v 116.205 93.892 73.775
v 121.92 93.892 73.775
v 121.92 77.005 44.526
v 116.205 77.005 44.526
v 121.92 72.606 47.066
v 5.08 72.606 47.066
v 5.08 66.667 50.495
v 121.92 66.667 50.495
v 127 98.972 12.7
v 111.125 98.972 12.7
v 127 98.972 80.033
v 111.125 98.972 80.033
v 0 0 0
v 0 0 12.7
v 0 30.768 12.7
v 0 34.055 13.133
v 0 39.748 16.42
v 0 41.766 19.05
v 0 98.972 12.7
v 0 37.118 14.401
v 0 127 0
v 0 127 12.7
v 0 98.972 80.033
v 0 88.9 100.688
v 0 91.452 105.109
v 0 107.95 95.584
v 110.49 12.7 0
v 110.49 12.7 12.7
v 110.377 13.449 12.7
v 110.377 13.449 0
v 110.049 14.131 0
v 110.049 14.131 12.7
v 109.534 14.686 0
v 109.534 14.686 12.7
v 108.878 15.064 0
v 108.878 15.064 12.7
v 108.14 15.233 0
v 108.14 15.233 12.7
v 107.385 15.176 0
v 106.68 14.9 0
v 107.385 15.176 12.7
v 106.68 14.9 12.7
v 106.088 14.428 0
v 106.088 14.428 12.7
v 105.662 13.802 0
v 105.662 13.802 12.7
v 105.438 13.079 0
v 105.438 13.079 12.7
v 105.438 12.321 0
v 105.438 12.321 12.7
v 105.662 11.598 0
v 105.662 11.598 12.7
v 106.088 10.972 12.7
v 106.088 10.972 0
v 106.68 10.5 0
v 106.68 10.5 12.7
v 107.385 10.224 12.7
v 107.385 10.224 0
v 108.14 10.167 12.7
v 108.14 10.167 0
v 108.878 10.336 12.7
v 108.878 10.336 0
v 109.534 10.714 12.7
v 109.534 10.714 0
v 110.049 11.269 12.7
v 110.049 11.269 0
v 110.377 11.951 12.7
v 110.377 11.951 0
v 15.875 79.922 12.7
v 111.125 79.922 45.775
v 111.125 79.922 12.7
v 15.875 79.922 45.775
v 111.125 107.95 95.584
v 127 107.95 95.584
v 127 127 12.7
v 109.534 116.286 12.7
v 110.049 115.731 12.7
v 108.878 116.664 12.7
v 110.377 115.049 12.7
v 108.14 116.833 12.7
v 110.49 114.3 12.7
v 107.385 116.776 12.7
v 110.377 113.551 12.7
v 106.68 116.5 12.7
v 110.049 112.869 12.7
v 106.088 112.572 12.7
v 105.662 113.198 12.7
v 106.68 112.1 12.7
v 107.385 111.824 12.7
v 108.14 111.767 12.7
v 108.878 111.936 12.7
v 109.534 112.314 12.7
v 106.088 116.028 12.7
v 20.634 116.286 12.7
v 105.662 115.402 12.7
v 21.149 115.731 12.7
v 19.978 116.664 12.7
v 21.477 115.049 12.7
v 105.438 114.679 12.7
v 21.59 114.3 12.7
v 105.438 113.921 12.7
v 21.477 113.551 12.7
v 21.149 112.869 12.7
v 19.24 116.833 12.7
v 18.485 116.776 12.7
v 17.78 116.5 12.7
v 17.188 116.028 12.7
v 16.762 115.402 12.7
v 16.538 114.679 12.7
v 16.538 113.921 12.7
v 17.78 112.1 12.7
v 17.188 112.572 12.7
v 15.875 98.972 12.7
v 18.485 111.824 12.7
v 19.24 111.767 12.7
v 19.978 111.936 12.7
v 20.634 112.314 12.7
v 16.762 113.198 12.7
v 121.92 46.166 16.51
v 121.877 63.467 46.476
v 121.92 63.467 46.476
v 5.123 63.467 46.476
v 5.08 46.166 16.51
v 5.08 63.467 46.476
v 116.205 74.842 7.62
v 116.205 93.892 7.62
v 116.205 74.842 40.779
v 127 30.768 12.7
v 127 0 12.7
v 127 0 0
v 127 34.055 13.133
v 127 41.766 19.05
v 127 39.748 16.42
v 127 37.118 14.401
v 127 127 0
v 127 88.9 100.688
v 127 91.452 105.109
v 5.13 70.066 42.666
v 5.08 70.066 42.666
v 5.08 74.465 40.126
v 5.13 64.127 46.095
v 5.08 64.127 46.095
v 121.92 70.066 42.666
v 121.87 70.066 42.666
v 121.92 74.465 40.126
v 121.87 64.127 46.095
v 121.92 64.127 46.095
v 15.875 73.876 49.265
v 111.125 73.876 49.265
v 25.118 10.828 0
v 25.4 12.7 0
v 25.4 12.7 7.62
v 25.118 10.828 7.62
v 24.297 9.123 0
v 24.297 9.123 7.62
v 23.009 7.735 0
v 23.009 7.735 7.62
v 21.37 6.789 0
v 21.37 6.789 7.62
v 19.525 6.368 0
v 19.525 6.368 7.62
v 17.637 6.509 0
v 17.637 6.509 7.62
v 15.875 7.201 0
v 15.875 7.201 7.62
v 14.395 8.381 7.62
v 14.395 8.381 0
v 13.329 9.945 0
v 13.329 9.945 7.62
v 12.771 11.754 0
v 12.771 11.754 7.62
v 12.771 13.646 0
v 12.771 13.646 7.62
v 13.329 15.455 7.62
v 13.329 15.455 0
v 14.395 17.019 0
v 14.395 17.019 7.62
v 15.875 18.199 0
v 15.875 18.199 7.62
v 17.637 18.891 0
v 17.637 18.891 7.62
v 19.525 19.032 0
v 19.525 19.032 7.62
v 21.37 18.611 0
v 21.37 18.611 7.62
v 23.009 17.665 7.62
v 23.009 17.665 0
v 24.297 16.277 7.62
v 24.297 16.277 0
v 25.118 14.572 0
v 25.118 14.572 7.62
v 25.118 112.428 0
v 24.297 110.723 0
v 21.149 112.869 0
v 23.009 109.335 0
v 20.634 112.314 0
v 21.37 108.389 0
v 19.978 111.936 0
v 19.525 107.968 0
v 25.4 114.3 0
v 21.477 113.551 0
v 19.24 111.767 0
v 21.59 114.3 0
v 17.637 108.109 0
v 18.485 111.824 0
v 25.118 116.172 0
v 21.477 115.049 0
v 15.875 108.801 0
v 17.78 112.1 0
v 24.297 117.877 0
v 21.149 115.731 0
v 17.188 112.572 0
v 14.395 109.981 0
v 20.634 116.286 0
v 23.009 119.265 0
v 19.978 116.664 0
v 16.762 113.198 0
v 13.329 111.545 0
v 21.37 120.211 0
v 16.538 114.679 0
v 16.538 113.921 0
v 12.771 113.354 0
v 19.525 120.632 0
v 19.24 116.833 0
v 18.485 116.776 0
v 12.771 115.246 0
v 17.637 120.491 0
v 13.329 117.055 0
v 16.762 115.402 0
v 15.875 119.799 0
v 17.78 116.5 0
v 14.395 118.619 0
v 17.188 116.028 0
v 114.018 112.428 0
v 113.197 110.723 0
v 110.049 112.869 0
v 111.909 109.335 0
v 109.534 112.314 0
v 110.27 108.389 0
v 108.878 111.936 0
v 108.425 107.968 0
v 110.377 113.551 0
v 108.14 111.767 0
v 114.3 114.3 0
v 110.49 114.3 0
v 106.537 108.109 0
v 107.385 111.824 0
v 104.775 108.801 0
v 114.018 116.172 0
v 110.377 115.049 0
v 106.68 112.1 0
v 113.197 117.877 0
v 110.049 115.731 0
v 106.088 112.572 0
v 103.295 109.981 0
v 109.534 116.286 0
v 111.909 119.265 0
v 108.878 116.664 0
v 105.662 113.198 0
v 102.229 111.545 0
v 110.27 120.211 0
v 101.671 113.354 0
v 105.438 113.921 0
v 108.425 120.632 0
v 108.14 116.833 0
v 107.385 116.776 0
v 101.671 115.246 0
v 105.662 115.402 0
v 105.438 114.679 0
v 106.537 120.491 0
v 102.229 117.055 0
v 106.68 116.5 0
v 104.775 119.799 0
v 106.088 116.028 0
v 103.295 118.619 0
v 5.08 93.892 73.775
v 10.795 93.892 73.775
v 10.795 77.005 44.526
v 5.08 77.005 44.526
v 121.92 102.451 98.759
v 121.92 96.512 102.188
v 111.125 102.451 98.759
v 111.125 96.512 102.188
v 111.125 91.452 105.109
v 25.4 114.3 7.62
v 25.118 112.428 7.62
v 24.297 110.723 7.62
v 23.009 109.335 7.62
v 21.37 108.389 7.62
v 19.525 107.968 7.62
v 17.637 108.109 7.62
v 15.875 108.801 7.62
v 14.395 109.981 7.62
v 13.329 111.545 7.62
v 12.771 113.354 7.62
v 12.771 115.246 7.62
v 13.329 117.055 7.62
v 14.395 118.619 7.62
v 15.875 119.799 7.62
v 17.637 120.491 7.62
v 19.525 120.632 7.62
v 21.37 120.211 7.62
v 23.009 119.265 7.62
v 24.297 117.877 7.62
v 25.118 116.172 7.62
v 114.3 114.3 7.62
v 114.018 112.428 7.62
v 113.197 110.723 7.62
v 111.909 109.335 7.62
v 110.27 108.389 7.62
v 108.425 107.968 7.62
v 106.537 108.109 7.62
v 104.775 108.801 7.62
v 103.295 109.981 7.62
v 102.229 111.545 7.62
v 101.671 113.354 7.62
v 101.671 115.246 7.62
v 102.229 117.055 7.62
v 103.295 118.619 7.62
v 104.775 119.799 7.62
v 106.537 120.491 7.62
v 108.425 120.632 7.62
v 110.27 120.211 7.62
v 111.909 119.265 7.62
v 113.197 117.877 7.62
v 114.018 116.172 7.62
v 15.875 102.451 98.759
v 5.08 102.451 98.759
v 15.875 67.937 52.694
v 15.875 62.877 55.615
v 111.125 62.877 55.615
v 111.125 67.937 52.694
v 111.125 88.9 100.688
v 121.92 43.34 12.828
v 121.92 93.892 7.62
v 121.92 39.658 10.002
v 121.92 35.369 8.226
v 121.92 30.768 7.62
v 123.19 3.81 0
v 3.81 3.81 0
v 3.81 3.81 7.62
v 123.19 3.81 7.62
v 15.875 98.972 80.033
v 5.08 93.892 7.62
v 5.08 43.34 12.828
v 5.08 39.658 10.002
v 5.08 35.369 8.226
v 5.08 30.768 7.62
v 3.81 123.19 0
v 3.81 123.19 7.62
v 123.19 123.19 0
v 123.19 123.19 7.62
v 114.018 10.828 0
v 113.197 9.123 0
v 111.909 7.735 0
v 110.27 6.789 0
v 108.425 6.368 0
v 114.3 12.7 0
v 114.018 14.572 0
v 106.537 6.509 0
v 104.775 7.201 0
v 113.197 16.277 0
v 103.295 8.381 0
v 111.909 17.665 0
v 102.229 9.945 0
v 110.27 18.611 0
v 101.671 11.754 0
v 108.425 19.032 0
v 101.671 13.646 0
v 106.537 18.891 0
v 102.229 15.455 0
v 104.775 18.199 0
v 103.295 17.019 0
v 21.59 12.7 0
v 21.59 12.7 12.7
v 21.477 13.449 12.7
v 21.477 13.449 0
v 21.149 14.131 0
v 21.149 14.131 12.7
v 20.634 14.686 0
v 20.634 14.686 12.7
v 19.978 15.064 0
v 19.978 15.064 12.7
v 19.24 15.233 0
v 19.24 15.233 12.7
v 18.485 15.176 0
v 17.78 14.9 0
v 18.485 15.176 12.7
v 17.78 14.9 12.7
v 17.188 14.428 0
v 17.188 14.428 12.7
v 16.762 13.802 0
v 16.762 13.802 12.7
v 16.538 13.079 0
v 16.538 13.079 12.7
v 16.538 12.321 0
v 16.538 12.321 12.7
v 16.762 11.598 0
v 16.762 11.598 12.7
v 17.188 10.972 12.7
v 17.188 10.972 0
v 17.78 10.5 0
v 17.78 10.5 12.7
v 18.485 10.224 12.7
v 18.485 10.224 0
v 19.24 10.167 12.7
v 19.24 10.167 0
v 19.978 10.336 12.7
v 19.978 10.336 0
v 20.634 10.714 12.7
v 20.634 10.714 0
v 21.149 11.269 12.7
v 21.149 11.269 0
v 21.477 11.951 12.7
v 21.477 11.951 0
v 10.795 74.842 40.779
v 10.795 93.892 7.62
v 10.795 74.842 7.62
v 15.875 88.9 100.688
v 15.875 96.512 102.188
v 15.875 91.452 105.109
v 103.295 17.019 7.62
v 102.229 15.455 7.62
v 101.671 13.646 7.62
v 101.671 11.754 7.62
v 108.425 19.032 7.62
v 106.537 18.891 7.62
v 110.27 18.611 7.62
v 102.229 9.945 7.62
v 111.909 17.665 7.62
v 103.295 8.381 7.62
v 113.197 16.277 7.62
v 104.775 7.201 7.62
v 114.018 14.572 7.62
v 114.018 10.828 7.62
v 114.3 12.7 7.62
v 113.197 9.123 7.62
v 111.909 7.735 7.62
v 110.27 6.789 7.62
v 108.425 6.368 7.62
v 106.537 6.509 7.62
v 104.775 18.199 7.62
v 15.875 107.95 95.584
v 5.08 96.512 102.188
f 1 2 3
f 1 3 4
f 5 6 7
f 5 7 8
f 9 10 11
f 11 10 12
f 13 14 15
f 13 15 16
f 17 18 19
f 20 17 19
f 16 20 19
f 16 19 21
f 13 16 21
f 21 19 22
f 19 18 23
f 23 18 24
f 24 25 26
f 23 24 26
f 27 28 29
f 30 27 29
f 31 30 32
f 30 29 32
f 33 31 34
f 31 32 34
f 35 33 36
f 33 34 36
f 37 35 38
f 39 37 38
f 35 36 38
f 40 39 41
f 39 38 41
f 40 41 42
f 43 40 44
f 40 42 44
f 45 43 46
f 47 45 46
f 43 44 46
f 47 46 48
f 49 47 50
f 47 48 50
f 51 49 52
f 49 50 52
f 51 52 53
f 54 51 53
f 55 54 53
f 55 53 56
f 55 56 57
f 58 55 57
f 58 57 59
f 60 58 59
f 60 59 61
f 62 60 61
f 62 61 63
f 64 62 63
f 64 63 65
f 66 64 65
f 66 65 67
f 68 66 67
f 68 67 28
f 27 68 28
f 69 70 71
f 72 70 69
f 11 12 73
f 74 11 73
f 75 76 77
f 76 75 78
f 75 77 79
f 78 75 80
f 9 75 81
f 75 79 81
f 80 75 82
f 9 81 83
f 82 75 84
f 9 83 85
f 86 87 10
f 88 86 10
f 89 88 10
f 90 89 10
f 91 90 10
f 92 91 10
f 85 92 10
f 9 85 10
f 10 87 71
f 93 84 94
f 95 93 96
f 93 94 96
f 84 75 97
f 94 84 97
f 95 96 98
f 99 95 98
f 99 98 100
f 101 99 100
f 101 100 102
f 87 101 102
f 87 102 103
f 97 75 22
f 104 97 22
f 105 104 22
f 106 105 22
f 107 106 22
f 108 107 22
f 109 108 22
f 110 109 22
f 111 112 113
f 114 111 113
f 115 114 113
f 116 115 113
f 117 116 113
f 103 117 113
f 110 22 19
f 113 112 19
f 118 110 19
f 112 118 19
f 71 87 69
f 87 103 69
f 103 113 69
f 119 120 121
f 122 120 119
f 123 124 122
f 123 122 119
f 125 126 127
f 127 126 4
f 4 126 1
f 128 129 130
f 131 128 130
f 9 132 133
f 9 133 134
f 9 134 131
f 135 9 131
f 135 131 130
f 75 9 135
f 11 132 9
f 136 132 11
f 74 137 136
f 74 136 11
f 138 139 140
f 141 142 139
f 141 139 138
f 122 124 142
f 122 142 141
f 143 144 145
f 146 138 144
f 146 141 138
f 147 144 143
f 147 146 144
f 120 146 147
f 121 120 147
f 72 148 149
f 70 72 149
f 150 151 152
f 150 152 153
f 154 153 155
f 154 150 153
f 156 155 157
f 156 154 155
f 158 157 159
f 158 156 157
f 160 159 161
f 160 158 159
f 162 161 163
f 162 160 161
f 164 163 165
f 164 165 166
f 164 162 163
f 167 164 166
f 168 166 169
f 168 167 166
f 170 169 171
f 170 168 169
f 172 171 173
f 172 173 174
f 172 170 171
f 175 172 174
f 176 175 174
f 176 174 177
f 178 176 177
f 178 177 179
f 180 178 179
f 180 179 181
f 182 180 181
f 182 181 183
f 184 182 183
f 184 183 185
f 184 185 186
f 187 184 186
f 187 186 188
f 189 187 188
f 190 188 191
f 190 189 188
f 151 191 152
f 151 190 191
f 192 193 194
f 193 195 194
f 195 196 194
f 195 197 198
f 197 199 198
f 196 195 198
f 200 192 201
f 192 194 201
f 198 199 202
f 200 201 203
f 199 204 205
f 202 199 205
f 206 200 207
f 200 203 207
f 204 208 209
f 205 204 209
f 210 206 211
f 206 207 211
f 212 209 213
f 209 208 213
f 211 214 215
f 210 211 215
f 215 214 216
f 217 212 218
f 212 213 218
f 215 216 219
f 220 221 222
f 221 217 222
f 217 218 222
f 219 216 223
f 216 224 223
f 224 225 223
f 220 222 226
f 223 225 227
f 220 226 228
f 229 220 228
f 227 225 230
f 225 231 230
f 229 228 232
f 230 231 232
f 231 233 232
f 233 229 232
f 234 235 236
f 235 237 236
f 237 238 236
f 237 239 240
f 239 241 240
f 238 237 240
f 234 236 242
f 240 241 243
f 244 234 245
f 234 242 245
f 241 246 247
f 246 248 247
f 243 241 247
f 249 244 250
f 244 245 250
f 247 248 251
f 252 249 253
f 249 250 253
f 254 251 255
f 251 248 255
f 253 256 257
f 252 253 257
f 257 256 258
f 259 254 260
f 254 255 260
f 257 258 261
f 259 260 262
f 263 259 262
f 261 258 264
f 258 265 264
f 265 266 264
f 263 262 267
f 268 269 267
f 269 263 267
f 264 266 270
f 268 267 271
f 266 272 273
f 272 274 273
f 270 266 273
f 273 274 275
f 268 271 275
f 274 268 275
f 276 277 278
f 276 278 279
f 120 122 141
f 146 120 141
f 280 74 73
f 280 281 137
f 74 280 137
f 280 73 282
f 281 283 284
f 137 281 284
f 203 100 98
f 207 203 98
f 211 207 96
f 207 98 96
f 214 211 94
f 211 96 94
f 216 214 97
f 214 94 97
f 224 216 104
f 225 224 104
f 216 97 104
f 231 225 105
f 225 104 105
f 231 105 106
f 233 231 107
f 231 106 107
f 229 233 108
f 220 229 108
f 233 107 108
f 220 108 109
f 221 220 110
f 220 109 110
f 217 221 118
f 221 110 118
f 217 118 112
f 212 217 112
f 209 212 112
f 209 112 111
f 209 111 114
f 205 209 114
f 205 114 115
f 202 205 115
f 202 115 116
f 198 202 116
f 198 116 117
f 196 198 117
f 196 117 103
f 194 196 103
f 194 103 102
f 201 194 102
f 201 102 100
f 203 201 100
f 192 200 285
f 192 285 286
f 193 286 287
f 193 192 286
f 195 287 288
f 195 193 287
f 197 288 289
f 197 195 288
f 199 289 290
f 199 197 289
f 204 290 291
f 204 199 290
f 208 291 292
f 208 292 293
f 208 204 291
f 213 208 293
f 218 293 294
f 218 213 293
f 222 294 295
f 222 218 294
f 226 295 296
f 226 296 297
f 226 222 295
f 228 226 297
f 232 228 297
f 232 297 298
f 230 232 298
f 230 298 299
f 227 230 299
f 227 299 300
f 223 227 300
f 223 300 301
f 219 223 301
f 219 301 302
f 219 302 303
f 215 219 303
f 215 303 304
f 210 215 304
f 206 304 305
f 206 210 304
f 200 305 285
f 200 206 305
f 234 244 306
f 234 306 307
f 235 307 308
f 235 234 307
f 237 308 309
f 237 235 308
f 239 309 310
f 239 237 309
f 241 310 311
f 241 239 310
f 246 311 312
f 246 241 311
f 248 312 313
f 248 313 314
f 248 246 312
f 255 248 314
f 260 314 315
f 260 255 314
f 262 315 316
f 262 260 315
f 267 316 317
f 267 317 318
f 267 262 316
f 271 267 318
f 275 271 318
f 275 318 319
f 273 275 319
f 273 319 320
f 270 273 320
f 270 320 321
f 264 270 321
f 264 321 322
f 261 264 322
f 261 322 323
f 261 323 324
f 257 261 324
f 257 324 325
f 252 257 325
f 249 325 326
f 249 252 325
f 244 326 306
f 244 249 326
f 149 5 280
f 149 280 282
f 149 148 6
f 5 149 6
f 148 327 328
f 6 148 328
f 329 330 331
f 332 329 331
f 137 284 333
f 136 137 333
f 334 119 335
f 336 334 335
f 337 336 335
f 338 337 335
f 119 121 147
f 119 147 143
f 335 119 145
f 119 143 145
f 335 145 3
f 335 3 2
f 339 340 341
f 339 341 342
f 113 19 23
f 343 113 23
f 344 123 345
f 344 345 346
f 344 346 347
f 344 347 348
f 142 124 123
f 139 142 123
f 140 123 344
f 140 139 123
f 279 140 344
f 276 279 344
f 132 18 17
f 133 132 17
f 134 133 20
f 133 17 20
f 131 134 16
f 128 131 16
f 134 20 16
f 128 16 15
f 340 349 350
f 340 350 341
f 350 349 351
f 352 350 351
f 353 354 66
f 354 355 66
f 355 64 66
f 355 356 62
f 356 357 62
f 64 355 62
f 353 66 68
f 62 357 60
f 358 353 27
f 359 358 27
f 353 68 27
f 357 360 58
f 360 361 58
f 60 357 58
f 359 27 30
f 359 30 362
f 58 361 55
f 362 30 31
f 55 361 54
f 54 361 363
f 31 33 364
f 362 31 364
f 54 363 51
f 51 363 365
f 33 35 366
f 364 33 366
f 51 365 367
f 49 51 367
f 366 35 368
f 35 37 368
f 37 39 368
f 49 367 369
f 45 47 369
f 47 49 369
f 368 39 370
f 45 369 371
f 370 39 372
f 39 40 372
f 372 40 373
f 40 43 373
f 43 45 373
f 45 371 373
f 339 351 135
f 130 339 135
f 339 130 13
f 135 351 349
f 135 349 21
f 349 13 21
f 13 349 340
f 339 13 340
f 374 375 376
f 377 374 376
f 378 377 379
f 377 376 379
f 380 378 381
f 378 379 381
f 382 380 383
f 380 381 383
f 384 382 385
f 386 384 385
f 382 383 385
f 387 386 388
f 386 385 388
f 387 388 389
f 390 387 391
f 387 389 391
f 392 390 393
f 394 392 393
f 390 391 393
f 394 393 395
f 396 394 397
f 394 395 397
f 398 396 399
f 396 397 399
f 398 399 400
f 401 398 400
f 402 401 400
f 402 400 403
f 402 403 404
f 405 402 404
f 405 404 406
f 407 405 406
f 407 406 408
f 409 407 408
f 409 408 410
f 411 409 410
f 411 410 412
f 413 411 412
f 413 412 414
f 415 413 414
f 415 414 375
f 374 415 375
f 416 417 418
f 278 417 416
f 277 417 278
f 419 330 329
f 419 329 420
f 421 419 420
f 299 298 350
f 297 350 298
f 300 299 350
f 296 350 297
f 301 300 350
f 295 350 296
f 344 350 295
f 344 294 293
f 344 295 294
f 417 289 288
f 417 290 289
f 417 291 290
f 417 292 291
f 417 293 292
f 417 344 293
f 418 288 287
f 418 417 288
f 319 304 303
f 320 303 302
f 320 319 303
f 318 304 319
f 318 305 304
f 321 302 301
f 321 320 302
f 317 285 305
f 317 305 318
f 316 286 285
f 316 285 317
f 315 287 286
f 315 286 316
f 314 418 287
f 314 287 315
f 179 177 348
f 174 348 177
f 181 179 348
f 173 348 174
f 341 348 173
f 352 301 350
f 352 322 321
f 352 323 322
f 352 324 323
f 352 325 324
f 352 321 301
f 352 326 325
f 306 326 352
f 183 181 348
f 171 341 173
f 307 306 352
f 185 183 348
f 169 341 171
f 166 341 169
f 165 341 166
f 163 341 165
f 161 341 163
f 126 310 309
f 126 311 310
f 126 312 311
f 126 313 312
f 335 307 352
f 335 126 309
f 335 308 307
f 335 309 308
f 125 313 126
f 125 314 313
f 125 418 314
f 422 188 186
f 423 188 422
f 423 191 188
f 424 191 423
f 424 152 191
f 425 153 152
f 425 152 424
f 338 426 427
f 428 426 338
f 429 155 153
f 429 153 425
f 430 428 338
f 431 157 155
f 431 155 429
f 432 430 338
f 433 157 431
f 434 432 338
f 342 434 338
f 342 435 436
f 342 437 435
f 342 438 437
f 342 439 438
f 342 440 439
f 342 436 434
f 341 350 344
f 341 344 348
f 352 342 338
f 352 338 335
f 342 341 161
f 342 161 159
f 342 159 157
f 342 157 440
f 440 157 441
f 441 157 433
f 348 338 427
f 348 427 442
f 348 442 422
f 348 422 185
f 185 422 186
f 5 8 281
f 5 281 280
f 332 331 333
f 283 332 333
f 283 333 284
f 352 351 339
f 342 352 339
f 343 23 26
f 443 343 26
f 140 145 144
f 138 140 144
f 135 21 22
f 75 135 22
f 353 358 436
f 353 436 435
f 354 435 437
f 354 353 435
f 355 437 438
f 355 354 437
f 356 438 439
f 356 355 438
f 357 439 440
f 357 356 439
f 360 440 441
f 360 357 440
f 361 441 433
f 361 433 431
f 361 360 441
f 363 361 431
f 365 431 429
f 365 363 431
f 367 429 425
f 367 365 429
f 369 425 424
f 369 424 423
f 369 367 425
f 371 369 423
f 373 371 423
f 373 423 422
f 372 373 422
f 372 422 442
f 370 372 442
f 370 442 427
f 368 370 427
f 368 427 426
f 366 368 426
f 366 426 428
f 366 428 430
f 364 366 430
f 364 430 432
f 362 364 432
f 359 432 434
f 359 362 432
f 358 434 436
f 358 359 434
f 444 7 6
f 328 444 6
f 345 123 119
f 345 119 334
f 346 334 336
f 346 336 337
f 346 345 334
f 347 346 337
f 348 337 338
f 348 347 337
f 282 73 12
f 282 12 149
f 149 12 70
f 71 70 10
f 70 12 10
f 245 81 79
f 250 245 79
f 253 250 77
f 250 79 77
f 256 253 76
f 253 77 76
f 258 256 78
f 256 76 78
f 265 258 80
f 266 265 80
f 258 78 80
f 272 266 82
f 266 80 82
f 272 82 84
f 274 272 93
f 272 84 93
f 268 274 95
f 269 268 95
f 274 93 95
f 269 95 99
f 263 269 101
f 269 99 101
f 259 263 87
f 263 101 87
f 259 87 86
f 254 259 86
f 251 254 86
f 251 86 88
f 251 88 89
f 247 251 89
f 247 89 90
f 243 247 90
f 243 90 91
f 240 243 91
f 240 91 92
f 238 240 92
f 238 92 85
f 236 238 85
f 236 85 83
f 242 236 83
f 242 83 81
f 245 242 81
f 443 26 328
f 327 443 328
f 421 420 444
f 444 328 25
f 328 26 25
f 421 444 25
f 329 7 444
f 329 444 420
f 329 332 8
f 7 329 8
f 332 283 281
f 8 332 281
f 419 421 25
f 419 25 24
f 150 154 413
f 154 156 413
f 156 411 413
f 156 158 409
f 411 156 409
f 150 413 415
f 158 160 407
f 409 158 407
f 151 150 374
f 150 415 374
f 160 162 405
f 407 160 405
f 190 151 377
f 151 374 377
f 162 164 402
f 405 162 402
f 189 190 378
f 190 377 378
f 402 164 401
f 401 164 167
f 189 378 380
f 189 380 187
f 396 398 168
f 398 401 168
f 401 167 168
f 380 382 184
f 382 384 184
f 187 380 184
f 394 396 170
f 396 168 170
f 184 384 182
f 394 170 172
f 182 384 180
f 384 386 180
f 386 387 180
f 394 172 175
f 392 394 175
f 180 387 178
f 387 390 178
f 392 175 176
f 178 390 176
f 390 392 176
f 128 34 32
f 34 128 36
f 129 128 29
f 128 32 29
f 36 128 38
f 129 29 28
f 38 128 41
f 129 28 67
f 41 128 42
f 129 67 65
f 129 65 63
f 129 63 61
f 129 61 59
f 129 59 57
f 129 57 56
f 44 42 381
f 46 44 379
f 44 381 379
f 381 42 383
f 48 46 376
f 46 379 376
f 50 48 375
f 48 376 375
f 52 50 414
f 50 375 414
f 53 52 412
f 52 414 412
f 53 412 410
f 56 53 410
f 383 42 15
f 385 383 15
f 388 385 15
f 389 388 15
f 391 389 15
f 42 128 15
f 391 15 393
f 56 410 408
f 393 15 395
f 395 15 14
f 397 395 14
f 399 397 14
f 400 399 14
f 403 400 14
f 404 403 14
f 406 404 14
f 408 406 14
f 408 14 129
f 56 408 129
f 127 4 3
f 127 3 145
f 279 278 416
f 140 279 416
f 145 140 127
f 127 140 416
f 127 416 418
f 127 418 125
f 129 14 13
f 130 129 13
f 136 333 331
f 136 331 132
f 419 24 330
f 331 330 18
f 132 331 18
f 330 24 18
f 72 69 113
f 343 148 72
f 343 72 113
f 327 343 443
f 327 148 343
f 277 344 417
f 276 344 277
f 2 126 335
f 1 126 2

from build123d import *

# Parameters (mm, degrees)
F1_DEPTH      = 127
F2_W          = 95.25
F2_H          = 57.15
F3_DEPTH      = 83.3406583964
F4_R          = 2.54
F5_DEPTH      = 12.701
F6_R          = 2.54
F7_DEPTH      = 12.701
F8_W          = 106.045
F8_H          = 6.858
F8_W_2        = 10.795
F9_DEPTH      = 59.69
F10_W         = 95.25
F10_H         = 22.0760425496
F10_H_2       = 18.8356010627
F11_DEPTH     = 19.05
F12_W         = 119.38
F12_H         = 119.38
F12_R         = 6.35
F13_DEPTH     = 7.62
F14_T         = 5.08
F14_T3_DEPTH  = 17.78
F14_T5_DEPTH  = 26.035
F14_T7_DEPTH  = 29.21
F14_T9_DEPTH  = 105.41
F14_T11_DEPTH = 26.035
F14_T13_DEPTH = 17.1416638094
F14_T15_DEPTH = 43.2345651777
F14_T17_DEPTH = 16.002
F14_T19_DEPTH = 69.85
F14_T21_DEPTH = 127
F14_T23_DEPTH = 17.018
F14_T25_DEPTH = 17.018


# Not quite as in the source:
# - a shell that OpenCascade refuses in one call is made with other operations: the cavity is built on its own and cut out


with BuildPart() as f1:
    # F0 (on Right) → F1 (new body)
    with BuildSketch(Plane.YZ):
        with BuildLine():
            Line((0, 12.7), (0, 0))
            Line((0, 0), (127, 0))
            Line((127, 0), (127, 12.7))
            Line((127, 12.7), (98.9720369056, 12.7))
            Line((98.9720369056, 12.7), (98.9720369056, 80.0334606807))
            Line((98.9720369056, 80.0334606807), (107.95, 95.5837489087))
            Line((107.95, 95.5837489087), (91.4522160579, 105.1087489087))
            Line((91.4522160579, 105.1087489087), (88.9, 100.6881810245))
            Line((88.9, 100.6881810245), (41.7661742094, 19.05))
            ThreePointArc((41.7661742094, 19.05), (37.1176515813, 14.4014773719), (30.7676515813, 12.7))
            Line((30.7676515813, 12.7), (0, 12.7))
        make_face()
    extrude(amount=F1_DEPTH)

    # F2 (on face) → F3 (cut, through all)
    with BuildSketch(Plane(origin=(0, 23.075738686, -13.3227839421), x_dir=(1, 0, 0), z_dir=(0, -0.8660254038, 0.5))):
        with Locations((63.5, 108.1779547439)):
            Rectangle(F2_W, F2_H)
    extrude(amount=-F3_DEPTH, mode=Mode.SUBTRACT)

    # F4 (on face) → F5 (cut, through all)
    with BuildSketch(Plane.XY.offset(12.7)):
        with Locations((19.05, 12.7)):
            Circle(F4_R)
        with Locations((107.95, 12.7)):
            Circle(F4_R)
    extrude(amount=-F5_DEPTH, mode=Mode.SUBTRACT)

    # F6 (on face) → F7 (cut, through all)
    with BuildSketch(Plane.XY.offset(12.7)):
        with Locations((19.05, 114.3)):
            Circle(F6_R)
        with Locations((107.95, 114.3)):
            Circle(F6_R)
    extrude(amount=-F7_DEPTH, mode=Mode.SUBTRACT)

    # F8 (on face) → F9 (cut)
    with BuildSketch(Plane(origin=(0, 68.3764773719, 118.4315328508), x_dir=(1, 0, 0), z_dir=(0, 0.5, 0.8660254038))):
        with Locations((58.1025, 35.9165678842)):
            Rectangle(F8_W, F8_H)
        with Locations((116.5225, 35.9165678842)):
            Rectangle(F8_W_2, F8_H)
    extrude(amount=-F9_DEPTH, mode=Mode.SUBTRACT)

    # F10 (on face) → F11 (cut)
    with BuildSketch(Plane(origin=(0, 98.9720369056, 0), x_dir=(-1, 0, 0), z_dir=(0, 1, 0))):
        with Locations((-63.5, 23.7380212748)):
            Rectangle(F10_W, F10_H)
        with Locations((-63.5, 44.193843081)):
            Rectangle(F10_W, F10_H_2)
    extrude(amount=-F11_DEPTH, mode=Mode.SUBTRACT)

    # F12 (on face) → F13 (cut)
    with BuildSketch(Plane(origin=(0, 0, 0), x_dir=(1, 0, 0), z_dir=(0, 0, -1))):
        with Locations((63.5, -63.5)):
            Rectangle(F12_W, F12_H)
        with Locations((19.05, -114.3)):
            Circle(F12_R, mode=Mode.SUBTRACT)
        with Locations((107.95, -114.3)):
            Circle(F12_R, mode=Mode.SUBTRACT)
        with Locations((19.05, -12.7)):
            Circle(F12_R, mode=Mode.SUBTRACT)
        with Locations((107.95, -12.7)):
            Circle(F12_R, mode=Mode.SUBTRACT)
    extrude(amount=-F13_DEPTH, mode=Mode.SUBTRACT)

    # F14: shell of thickness 5.08, made by hand


with BuildPart() as f14_core1:
    # F14_t2: copy of F1
    add(f1.part)

    # the walls: a layer under each face that stays
    f14_faces = [f14_core1.faces().sort_by_distance(p)[0] for p in [
        (63.5, 0, 6.35),
        (63.5, 15.3838257906, 12.7),
        (125.4320987654, 107.15625, 0),
        (0, 63.5, 52.5543744543),
        (127, 63.5, 52.5543744543),
        (63.5, 37.1176515813, 14.4014773719),
        (105.41, 12.7, 6.35),
        (16.51, 12.7, 6.35),
        (63.5, 127, 6.35),
        (3.81, 63.5, 3.81),
        (63.5, 3.81, 3.81),
        (123.19, 63.5, 3.81),
        (63.5, 123.19, 3.81),
        (63.5, 103.4610184528, 12.7),
        (7.9375, 98.9720369056, 46.3667303403),
        (7.9375, 103.4610184528, 87.8086047947),
        (13.2291666667, 105.200369343, 97.1712489087),
        (105.8333333333, 50.0471811841, 33.3931248181),
        (119.0625, 98.9720369056, 46.3667303403),
        (119.0625, 103.4610184528, 87.8086047947),
        (124.3541666667, 105.200369343, 97.1712489087),
        (112.1833333333, 8.4666666667, 0),
        (23.2833333333, 8.4666666667, 0),
        (111.125, 90.912869343, 55.7293744543),
        (63.5, 79.9220369056, 29.2372825889),
        (15.875, 98.3301377958, 51.6049284688),
        (105.41, 114.3, 6.35),
        (16.51, 114.3, 6.35),
        (15.875, 79.6943762624, 78.9015729955),
        (13.4257142857, 68.7983221811, 54.1870537248),
        (5.08, 84.5586375764, 74.6267207327),
        (113.5742857143, 74.7375244003, 50.7580537248),
        (111.125, 79.6943762624, 78.9015729955),
        (63.5, 65.4068762624, 54.1548970824),
        (121.92, 84.5586375764, 74.6267207327),
        (101.6, 12.7, 3.81),
        (12.7, 12.7, 3.81),
        (12.7, 114.3, 3.81),
        (101.6, 114.3, 3.81),
        (63.5, 76.8988877958, 47.5199811301),
        (112.1833333333, 110.0666666667, 0),
        (23.2833333333, 110.0666666667, 0),
        (63.5, 69.6361375764, 48.7801925568),
    ]]
    thicken(f14_faces, amount=-F14_T, mode=Mode.SUBTRACT)

    # F14_s4 → F14_t3 (cut)
    with BuildSketch(Plane.XY.offset(-5.08)):
        Polygon((3.8608, 3.8608), (-1.27, 3.81), (-1.27, -1.27), (3.81, -1.27), align=None)
        Polygon((3.8608, 123.1392), (-1.27, 123.19), (-1.27, 128.27), (3.81, 128.27), align=None)
        Polygon((123.1392, 3.8608), (123.19, -1.27), (128.27, -1.27), (128.27, 3.81), align=None)
        Polygon((123.1392, 123.1392), (128.27, 123.19), (128.27, 128.27), (123.19, 128.27), align=None)
    extrude(amount=F14_T3_DEPTH, mode=Mode.SUBTRACT)

    # F14_s6 → F14_t5 (cut)
    with BuildSketch(Plane.YZ.offset(106.045)):
        Polygon((99.0228369056, 12.7508), (98.9720369056, 7.62), (93.8920369056, 7.62), (93.8920369056, 12.7), align=None)
        Polygon((99.0668309961, 80.0080606807), (93.8920369056, 80.0334606807), (93.8920369056, 81.3946425782), (94.5726278544, 82.5734606807), align=None)
    extrude(amount=F14_T5_DEPTH, mode=Mode.SUBTRACT)

    # F14_s8 → F14_t7 (cut)
    with BuildSketch(Plane.XZ.offset(-104.0520369056)):
        Polygon((111.0742, 12.7508), (111.125, 7.62), (116.205, 7.62), (116.205, 12.7), align=None)
        Polygon((15.9258, 12.7508), (15.875, 7.62), (10.795, 7.62), (10.795, 12.7), align=None)
    extrude(amount=F14_T7_DEPTH, mode=Mode.SUBTRACT)

    # F14_s10 → F14_t9 (cut)
    with BuildSketch(Plane.YZ.offset(10.795)):
        Polygon((79.9728369056, 12.7508), (79.9220369056, 7.62), (74.8420369056, 7.62), (74.8420369056, 12.7), align=None)
    extrude(amount=F14_T9_DEPTH, mode=Mode.SUBTRACT)

    # F14_s12 → F14_t11 (cut)
    with BuildSketch(Plane.YZ.offset(-5.08)):
        Polygon((99.0228369056, 12.7508), (98.9720369056, 7.62), (93.8920369056, 7.62), (93.8920369056, 12.7), align=None)
        Polygon((99.0668309961, 80.0080606807), (93.8920369056, 80.0334606807), (93.8920369056, 81.3946425782), (94.5726278544, 82.5734606807), align=None)
    extrude(amount=F14_T11_DEPTH, mode=Mode.SUBTRACT)

    # F14_s14 → F14_t13 (cut)
    with BuildSketch(Plane(origin=(0, 29.6748522628, -17.1327839421), x_dir=(1, 0, 0), z_dir=(0, 0.8660254038, -0.5))):
        Polygon((111.0742, -79.6537547439), (116.205, -79.6029547439), (116.205, -74.5229547439), (111.125, -74.5229547439), align=None)
        Polygon((15.9258, -79.6537547439), (10.795, -79.6029547439), (10.795, -74.5229547439), (15.875, -74.5229547439), align=None)
    extrude(amount=F14_T13_DEPTH, mode=Mode.SUBTRACT)

    # F14_s16 → F14_t15 (cut)
    with BuildSketch(Plane.XY.offset(7.62)):
        Polygon((111.0742, 79.9728369056), (116.205, 79.9220369056), (116.205, 74.8420369056), (111.125, 74.8420369056), align=None)
        Polygon((15.9258, 79.9728369056), (15.875, 74.8420369056), (10.795, 74.8420369056), (10.795, 79.9220369056), align=None)
    extrude(amount=F14_T15_DEPTH, mode=Mode.SUBTRACT)

    # F14_s18 → F14_t17 (cut)
    with BuildSketch(Plane(origin=(0, 18.6763296347, -10.7827839421), x_dir=(1, 0, 0), z_dir=(0, 0.8660254038, -0.5))):
        Polygon((15.9258, -79.6537547439), (10.795, -79.6029547439), (10.795, -74.5229547439), (15.875, -74.5229547439), align=None)
        Polygon((111.0742, -79.6537547439), (116.205, -79.6029547439), (116.205, -74.5229547439), (111.125, -74.5229547439), align=None)
    extrude(amount=F14_T17_DEPTH, mode=Mode.SUBTRACT)

    # F14_s20 → F14_t19 (cut)
    with BuildSketch(Plane(origin=(0, 70.9164773719, 122.830941902), x_dir=(1, 0, 0), z_dir=(0, -0.5, -0.8660254038))):
        Polygon((121.8692, -32.5383678842), (121.92, -27.4075678842), (127, -27.4075678842), (127, -32.4875678842), align=None)
        Polygon((5.1308, -32.5383678842), (5.08, -27.4075678842), (0, -27.4075678842), (0, -32.4875678842), align=None)
        Polygon((5.1308, -39.2947678842), (0, -39.3455678842), (0, -44.4255678842), (5.08, -44.4255678842), align=None)
        Polygon((121.8692, -39.2947678842), (121.92, -44.4255678842), (127, -44.4255678842), (127, -39.3455678842), align=None)
    extrude(amount=F14_T19_DEPTH, mode=Mode.SUBTRACT)

    # F14_s22 → F14_t21 (cut)
    with BuildSketch(Plane.YZ):
        Polygon((66.7359305573, 50.5132866473), (62.2671274156, 53.0346925568), (59.7271274156, 48.6352835056), (64.1265364668, 46.0952835056), align=None)
        Polygon((72.5871445955, 47.1350866473), (77.0051477372, 44.5256925568), (74.4651477372, 40.1262835056), (70.065738686, 42.6662835056), align=None)
    extrude(amount=F14_T21_DEPTH, mode=Mode.SUBTRACT)

    # F14_s24 → F14_t23 (cut)
    with BuildSketch(Plane(origin=(0, 38.4736703653, -22.2127839421), x_dir=(1, 0, 0), z_dir=(0, -0.8660254038, 0.5))):
        Polygon((5.1308, 77.1137547439), (0, 77.0629547439), (0, 71.9829547439), (5.08, 71.9829547439), align=None)
    extrude(amount=F14_T23_DEPTH, mode=Mode.SUBTRACT)

    # F14_s26 → F14_t25 (cut)
    with BuildSketch(Plane(origin=(0, 23.7356500437, -13.7037839421), x_dir=(1, 0, 0), z_dir=(0, 0.8660254038, -0.5))):
        Polygon((121.8692, -77.1137547439), (127, -77.0629547439), (127, -71.9829547439), (121.92, -71.9829547439), align=None)
    extrude(amount=F14_T25_DEPTH, mode=Mode.SUBTRACT)


with BuildPart() as f1_1:
    add(f1.part)

    # what is left inside the walls is the cavity
    f14_cavity = [f14_core1.part.solids().sort_by_distance(p)[0] for p in [
        (63.5, 72.850575, 7.6708),
    ]]
    add(f14_cavity, mode=Mode.SUBTRACT)


solid = f1_1.part
